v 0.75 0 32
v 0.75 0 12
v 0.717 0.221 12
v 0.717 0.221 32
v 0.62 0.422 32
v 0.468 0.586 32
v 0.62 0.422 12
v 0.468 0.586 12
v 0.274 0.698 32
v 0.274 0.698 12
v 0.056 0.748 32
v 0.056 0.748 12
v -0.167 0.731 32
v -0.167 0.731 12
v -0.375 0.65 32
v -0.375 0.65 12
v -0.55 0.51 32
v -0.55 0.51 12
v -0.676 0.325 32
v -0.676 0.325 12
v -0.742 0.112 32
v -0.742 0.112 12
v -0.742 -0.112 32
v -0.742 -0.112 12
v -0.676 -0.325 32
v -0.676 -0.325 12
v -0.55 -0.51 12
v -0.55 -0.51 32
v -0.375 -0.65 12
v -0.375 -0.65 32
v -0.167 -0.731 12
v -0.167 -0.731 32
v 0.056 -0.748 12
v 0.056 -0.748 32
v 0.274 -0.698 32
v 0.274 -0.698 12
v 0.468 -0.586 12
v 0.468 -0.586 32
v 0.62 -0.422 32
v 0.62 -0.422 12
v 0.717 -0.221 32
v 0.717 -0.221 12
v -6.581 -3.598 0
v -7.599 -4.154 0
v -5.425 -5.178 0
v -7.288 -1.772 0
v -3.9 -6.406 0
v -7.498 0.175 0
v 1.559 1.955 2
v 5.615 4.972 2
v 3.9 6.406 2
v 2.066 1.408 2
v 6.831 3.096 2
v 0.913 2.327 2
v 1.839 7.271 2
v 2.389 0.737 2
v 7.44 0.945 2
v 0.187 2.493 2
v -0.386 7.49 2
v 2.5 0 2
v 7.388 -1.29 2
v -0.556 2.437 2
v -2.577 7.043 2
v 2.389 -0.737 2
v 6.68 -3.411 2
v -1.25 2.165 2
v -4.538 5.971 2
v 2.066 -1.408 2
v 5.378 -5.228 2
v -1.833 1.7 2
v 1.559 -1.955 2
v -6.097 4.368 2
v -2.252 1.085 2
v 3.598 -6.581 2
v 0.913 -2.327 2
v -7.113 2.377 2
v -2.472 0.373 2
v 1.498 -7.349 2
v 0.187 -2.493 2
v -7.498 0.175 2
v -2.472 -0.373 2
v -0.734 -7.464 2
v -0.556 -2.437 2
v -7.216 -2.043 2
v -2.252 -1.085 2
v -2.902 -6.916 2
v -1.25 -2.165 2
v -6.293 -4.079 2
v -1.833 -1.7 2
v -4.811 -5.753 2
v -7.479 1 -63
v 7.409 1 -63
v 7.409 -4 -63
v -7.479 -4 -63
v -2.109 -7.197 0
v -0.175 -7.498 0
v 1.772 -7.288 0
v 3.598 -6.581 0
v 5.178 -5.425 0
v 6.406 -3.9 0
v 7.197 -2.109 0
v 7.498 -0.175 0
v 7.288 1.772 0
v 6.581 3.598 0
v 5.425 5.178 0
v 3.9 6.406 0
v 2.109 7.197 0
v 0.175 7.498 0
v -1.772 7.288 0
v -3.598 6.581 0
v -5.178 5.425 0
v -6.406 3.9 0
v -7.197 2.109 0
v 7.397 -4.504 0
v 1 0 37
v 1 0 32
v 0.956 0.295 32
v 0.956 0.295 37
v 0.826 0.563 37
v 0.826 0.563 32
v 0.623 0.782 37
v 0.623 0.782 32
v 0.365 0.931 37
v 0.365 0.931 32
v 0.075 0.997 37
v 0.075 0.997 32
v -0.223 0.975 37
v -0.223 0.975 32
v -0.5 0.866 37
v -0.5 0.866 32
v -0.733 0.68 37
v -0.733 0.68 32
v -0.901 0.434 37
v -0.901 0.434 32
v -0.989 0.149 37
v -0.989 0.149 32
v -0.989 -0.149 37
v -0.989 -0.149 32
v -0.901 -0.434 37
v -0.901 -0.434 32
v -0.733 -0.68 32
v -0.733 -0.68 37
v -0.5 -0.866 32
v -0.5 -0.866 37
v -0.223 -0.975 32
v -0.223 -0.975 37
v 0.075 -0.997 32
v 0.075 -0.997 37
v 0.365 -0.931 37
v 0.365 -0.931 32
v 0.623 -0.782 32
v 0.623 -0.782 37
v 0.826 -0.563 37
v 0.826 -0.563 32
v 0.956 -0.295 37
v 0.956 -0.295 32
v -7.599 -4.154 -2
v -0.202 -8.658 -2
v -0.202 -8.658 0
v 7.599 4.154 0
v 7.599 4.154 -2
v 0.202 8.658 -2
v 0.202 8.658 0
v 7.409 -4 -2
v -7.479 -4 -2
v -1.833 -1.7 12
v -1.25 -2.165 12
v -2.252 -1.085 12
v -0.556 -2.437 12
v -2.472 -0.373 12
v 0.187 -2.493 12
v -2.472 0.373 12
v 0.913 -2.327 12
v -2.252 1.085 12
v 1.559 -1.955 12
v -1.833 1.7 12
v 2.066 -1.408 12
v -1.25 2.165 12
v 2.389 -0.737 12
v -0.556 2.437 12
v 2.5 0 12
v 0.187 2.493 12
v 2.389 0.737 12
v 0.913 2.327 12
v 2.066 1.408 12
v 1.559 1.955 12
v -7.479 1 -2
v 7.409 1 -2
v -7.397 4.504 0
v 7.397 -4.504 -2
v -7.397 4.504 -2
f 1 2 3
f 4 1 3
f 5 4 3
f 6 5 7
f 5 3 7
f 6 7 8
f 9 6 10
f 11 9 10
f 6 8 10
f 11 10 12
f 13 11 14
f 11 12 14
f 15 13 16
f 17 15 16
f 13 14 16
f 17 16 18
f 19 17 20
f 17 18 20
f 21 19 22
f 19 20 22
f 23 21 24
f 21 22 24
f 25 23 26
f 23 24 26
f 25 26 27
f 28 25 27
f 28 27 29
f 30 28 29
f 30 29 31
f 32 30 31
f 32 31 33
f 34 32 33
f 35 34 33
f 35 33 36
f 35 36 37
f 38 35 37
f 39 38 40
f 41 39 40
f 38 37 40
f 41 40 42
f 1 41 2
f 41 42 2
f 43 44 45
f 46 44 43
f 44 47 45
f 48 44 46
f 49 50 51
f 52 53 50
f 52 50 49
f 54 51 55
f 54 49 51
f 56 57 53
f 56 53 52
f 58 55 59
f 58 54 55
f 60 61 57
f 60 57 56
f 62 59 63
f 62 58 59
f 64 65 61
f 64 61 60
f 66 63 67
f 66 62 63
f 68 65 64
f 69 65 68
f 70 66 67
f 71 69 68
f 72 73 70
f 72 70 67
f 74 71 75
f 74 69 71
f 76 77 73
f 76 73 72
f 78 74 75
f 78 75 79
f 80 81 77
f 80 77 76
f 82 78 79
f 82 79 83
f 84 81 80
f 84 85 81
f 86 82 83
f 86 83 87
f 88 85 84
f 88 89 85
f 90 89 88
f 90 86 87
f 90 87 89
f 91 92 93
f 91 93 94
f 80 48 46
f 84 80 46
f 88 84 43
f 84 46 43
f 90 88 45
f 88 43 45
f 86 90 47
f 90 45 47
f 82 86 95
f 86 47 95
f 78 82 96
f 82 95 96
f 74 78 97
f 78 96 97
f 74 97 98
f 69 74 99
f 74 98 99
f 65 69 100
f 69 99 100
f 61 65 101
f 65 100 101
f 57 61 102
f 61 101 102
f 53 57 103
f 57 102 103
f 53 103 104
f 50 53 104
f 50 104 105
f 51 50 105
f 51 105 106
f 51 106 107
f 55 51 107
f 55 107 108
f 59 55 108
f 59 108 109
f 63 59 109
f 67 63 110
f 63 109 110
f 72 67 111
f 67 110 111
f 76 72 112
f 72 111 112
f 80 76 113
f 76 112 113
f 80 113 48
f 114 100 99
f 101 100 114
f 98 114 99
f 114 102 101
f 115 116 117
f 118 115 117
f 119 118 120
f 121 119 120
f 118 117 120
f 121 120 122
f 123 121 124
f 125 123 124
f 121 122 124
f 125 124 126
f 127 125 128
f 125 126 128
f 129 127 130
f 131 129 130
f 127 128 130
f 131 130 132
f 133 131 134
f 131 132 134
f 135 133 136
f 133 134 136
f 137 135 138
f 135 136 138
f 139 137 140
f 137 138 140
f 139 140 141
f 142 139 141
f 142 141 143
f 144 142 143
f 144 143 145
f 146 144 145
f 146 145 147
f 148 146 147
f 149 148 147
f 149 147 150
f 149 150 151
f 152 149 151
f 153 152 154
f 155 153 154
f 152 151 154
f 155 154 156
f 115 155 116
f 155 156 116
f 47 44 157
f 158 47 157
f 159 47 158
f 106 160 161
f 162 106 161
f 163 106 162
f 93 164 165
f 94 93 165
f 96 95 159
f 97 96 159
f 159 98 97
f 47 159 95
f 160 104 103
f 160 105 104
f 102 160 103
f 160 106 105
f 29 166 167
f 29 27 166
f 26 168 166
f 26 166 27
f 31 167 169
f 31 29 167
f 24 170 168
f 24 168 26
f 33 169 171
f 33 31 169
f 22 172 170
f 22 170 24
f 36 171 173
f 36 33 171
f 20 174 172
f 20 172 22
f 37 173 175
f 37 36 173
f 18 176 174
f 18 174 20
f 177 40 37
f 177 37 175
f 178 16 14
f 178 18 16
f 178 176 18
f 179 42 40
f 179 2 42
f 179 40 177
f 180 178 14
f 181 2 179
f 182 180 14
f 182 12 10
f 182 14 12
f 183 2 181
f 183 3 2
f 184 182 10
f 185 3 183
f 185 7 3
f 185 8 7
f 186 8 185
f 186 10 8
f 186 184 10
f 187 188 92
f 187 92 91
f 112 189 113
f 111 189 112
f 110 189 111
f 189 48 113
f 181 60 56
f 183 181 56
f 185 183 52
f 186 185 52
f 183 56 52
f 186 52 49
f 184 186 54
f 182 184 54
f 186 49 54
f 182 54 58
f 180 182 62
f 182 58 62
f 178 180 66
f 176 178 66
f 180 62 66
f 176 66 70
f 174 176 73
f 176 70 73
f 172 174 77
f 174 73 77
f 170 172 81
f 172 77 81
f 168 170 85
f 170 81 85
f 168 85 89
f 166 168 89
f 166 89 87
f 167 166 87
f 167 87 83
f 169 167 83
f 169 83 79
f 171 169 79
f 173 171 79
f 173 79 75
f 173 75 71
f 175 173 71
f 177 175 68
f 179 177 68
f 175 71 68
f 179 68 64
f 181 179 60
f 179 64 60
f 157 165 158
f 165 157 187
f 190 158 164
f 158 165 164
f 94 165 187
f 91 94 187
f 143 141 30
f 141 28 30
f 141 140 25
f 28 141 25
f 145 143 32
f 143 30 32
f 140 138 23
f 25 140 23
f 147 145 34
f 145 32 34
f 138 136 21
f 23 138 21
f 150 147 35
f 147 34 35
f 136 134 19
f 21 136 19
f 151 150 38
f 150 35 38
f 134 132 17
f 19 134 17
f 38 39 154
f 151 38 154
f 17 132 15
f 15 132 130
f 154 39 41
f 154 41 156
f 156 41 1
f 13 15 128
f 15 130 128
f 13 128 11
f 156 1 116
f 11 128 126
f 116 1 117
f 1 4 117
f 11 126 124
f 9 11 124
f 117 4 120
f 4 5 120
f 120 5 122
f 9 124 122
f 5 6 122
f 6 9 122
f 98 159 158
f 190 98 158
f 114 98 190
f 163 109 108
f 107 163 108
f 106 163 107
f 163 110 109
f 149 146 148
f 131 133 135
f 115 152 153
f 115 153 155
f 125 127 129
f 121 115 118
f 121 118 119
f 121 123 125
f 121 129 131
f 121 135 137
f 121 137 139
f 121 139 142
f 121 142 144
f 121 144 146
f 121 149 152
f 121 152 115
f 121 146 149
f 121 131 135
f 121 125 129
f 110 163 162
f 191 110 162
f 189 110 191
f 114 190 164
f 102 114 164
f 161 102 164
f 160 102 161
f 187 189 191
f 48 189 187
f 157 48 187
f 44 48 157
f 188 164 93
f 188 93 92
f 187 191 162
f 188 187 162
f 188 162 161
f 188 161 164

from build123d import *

# Parameters (mm, degrees)
BOSS_EXTRUDE1_DEPTH = 2
SKETCH2_R           = 7.5
BOSS_EXTRUDE2_DEPTH = 2
SKETCH3_R           = 2.5
BOSS_EXTRUDE3_DEPTH = 10
SKETCH4_R           = 0.75
BOSS_EXTRUDE4_DEPTH = 20
SKETCH5_R           = 1
BOSS_EXTRUDE5_DEPTH = 5
SKETCH6_W           = 14.887597411
SKETCH6_H           = 5
BOSS_EXTRUDE6_DEPTH = 61


with BuildPart() as part:
    # Sketch1 → Boss-Extrude1 (new body)
    with BuildSketch(Plane.XY):
        Polygon((7.397125851, -4.5036129), (7.598806105, 4.154292452), (0.201680255, 8.657905351), (-7.397125851, 4.5036129), (-7.598806105, -4.154292452), (-0.201680255, -8.657905351), align=None)
    extrude(amount=-BOSS_EXTRUDE1_DEPTH)

    # Sketch2 → Boss-Extrude2 (add)
    with BuildSketch(Plane.XY):
        with Locations(Location((0, 0, 0), (0, 0, 178.665573541))):
            Circle(SKETCH2_R)
    extrude(amount=BOSS_EXTRUDE2_DEPTH)

    # Sketch3 → Boss-Extrude3 (add)
    with BuildSketch(Plane.XY.offset(2)):
        Circle(SKETCH3_R)
    extrude(amount=BOSS_EXTRUDE3_DEPTH)

    # Sketch4 → Boss-Extrude4 (add)
    with BuildSketch(Plane.XY.offset(12)):
        Circle(SKETCH4_R)
    extrude(amount=BOSS_EXTRUDE4_DEPTH)

    # Sketch5 → Boss-Extrude5 (add)
    with BuildSketch(Plane.XY.offset(32)):
        Circle(SKETCH5_R)
    extrude(amount=BOSS_EXTRUDE5_DEPTH)

    # Sketch6 → Boss-Extrude6 (add)
    with BuildSketch(Plane(origin=(0, 0, -2), x_dir=(-1, 0, 0), z_dir=(0, 0, -1))):
        with Locations((0.034941521, -1.5)):
            Rectangle(SKETCH6_W, SKETCH6_H)
    extrude(amount=BOSS_EXTRUDE6_DEPTH)


solid = part.part
